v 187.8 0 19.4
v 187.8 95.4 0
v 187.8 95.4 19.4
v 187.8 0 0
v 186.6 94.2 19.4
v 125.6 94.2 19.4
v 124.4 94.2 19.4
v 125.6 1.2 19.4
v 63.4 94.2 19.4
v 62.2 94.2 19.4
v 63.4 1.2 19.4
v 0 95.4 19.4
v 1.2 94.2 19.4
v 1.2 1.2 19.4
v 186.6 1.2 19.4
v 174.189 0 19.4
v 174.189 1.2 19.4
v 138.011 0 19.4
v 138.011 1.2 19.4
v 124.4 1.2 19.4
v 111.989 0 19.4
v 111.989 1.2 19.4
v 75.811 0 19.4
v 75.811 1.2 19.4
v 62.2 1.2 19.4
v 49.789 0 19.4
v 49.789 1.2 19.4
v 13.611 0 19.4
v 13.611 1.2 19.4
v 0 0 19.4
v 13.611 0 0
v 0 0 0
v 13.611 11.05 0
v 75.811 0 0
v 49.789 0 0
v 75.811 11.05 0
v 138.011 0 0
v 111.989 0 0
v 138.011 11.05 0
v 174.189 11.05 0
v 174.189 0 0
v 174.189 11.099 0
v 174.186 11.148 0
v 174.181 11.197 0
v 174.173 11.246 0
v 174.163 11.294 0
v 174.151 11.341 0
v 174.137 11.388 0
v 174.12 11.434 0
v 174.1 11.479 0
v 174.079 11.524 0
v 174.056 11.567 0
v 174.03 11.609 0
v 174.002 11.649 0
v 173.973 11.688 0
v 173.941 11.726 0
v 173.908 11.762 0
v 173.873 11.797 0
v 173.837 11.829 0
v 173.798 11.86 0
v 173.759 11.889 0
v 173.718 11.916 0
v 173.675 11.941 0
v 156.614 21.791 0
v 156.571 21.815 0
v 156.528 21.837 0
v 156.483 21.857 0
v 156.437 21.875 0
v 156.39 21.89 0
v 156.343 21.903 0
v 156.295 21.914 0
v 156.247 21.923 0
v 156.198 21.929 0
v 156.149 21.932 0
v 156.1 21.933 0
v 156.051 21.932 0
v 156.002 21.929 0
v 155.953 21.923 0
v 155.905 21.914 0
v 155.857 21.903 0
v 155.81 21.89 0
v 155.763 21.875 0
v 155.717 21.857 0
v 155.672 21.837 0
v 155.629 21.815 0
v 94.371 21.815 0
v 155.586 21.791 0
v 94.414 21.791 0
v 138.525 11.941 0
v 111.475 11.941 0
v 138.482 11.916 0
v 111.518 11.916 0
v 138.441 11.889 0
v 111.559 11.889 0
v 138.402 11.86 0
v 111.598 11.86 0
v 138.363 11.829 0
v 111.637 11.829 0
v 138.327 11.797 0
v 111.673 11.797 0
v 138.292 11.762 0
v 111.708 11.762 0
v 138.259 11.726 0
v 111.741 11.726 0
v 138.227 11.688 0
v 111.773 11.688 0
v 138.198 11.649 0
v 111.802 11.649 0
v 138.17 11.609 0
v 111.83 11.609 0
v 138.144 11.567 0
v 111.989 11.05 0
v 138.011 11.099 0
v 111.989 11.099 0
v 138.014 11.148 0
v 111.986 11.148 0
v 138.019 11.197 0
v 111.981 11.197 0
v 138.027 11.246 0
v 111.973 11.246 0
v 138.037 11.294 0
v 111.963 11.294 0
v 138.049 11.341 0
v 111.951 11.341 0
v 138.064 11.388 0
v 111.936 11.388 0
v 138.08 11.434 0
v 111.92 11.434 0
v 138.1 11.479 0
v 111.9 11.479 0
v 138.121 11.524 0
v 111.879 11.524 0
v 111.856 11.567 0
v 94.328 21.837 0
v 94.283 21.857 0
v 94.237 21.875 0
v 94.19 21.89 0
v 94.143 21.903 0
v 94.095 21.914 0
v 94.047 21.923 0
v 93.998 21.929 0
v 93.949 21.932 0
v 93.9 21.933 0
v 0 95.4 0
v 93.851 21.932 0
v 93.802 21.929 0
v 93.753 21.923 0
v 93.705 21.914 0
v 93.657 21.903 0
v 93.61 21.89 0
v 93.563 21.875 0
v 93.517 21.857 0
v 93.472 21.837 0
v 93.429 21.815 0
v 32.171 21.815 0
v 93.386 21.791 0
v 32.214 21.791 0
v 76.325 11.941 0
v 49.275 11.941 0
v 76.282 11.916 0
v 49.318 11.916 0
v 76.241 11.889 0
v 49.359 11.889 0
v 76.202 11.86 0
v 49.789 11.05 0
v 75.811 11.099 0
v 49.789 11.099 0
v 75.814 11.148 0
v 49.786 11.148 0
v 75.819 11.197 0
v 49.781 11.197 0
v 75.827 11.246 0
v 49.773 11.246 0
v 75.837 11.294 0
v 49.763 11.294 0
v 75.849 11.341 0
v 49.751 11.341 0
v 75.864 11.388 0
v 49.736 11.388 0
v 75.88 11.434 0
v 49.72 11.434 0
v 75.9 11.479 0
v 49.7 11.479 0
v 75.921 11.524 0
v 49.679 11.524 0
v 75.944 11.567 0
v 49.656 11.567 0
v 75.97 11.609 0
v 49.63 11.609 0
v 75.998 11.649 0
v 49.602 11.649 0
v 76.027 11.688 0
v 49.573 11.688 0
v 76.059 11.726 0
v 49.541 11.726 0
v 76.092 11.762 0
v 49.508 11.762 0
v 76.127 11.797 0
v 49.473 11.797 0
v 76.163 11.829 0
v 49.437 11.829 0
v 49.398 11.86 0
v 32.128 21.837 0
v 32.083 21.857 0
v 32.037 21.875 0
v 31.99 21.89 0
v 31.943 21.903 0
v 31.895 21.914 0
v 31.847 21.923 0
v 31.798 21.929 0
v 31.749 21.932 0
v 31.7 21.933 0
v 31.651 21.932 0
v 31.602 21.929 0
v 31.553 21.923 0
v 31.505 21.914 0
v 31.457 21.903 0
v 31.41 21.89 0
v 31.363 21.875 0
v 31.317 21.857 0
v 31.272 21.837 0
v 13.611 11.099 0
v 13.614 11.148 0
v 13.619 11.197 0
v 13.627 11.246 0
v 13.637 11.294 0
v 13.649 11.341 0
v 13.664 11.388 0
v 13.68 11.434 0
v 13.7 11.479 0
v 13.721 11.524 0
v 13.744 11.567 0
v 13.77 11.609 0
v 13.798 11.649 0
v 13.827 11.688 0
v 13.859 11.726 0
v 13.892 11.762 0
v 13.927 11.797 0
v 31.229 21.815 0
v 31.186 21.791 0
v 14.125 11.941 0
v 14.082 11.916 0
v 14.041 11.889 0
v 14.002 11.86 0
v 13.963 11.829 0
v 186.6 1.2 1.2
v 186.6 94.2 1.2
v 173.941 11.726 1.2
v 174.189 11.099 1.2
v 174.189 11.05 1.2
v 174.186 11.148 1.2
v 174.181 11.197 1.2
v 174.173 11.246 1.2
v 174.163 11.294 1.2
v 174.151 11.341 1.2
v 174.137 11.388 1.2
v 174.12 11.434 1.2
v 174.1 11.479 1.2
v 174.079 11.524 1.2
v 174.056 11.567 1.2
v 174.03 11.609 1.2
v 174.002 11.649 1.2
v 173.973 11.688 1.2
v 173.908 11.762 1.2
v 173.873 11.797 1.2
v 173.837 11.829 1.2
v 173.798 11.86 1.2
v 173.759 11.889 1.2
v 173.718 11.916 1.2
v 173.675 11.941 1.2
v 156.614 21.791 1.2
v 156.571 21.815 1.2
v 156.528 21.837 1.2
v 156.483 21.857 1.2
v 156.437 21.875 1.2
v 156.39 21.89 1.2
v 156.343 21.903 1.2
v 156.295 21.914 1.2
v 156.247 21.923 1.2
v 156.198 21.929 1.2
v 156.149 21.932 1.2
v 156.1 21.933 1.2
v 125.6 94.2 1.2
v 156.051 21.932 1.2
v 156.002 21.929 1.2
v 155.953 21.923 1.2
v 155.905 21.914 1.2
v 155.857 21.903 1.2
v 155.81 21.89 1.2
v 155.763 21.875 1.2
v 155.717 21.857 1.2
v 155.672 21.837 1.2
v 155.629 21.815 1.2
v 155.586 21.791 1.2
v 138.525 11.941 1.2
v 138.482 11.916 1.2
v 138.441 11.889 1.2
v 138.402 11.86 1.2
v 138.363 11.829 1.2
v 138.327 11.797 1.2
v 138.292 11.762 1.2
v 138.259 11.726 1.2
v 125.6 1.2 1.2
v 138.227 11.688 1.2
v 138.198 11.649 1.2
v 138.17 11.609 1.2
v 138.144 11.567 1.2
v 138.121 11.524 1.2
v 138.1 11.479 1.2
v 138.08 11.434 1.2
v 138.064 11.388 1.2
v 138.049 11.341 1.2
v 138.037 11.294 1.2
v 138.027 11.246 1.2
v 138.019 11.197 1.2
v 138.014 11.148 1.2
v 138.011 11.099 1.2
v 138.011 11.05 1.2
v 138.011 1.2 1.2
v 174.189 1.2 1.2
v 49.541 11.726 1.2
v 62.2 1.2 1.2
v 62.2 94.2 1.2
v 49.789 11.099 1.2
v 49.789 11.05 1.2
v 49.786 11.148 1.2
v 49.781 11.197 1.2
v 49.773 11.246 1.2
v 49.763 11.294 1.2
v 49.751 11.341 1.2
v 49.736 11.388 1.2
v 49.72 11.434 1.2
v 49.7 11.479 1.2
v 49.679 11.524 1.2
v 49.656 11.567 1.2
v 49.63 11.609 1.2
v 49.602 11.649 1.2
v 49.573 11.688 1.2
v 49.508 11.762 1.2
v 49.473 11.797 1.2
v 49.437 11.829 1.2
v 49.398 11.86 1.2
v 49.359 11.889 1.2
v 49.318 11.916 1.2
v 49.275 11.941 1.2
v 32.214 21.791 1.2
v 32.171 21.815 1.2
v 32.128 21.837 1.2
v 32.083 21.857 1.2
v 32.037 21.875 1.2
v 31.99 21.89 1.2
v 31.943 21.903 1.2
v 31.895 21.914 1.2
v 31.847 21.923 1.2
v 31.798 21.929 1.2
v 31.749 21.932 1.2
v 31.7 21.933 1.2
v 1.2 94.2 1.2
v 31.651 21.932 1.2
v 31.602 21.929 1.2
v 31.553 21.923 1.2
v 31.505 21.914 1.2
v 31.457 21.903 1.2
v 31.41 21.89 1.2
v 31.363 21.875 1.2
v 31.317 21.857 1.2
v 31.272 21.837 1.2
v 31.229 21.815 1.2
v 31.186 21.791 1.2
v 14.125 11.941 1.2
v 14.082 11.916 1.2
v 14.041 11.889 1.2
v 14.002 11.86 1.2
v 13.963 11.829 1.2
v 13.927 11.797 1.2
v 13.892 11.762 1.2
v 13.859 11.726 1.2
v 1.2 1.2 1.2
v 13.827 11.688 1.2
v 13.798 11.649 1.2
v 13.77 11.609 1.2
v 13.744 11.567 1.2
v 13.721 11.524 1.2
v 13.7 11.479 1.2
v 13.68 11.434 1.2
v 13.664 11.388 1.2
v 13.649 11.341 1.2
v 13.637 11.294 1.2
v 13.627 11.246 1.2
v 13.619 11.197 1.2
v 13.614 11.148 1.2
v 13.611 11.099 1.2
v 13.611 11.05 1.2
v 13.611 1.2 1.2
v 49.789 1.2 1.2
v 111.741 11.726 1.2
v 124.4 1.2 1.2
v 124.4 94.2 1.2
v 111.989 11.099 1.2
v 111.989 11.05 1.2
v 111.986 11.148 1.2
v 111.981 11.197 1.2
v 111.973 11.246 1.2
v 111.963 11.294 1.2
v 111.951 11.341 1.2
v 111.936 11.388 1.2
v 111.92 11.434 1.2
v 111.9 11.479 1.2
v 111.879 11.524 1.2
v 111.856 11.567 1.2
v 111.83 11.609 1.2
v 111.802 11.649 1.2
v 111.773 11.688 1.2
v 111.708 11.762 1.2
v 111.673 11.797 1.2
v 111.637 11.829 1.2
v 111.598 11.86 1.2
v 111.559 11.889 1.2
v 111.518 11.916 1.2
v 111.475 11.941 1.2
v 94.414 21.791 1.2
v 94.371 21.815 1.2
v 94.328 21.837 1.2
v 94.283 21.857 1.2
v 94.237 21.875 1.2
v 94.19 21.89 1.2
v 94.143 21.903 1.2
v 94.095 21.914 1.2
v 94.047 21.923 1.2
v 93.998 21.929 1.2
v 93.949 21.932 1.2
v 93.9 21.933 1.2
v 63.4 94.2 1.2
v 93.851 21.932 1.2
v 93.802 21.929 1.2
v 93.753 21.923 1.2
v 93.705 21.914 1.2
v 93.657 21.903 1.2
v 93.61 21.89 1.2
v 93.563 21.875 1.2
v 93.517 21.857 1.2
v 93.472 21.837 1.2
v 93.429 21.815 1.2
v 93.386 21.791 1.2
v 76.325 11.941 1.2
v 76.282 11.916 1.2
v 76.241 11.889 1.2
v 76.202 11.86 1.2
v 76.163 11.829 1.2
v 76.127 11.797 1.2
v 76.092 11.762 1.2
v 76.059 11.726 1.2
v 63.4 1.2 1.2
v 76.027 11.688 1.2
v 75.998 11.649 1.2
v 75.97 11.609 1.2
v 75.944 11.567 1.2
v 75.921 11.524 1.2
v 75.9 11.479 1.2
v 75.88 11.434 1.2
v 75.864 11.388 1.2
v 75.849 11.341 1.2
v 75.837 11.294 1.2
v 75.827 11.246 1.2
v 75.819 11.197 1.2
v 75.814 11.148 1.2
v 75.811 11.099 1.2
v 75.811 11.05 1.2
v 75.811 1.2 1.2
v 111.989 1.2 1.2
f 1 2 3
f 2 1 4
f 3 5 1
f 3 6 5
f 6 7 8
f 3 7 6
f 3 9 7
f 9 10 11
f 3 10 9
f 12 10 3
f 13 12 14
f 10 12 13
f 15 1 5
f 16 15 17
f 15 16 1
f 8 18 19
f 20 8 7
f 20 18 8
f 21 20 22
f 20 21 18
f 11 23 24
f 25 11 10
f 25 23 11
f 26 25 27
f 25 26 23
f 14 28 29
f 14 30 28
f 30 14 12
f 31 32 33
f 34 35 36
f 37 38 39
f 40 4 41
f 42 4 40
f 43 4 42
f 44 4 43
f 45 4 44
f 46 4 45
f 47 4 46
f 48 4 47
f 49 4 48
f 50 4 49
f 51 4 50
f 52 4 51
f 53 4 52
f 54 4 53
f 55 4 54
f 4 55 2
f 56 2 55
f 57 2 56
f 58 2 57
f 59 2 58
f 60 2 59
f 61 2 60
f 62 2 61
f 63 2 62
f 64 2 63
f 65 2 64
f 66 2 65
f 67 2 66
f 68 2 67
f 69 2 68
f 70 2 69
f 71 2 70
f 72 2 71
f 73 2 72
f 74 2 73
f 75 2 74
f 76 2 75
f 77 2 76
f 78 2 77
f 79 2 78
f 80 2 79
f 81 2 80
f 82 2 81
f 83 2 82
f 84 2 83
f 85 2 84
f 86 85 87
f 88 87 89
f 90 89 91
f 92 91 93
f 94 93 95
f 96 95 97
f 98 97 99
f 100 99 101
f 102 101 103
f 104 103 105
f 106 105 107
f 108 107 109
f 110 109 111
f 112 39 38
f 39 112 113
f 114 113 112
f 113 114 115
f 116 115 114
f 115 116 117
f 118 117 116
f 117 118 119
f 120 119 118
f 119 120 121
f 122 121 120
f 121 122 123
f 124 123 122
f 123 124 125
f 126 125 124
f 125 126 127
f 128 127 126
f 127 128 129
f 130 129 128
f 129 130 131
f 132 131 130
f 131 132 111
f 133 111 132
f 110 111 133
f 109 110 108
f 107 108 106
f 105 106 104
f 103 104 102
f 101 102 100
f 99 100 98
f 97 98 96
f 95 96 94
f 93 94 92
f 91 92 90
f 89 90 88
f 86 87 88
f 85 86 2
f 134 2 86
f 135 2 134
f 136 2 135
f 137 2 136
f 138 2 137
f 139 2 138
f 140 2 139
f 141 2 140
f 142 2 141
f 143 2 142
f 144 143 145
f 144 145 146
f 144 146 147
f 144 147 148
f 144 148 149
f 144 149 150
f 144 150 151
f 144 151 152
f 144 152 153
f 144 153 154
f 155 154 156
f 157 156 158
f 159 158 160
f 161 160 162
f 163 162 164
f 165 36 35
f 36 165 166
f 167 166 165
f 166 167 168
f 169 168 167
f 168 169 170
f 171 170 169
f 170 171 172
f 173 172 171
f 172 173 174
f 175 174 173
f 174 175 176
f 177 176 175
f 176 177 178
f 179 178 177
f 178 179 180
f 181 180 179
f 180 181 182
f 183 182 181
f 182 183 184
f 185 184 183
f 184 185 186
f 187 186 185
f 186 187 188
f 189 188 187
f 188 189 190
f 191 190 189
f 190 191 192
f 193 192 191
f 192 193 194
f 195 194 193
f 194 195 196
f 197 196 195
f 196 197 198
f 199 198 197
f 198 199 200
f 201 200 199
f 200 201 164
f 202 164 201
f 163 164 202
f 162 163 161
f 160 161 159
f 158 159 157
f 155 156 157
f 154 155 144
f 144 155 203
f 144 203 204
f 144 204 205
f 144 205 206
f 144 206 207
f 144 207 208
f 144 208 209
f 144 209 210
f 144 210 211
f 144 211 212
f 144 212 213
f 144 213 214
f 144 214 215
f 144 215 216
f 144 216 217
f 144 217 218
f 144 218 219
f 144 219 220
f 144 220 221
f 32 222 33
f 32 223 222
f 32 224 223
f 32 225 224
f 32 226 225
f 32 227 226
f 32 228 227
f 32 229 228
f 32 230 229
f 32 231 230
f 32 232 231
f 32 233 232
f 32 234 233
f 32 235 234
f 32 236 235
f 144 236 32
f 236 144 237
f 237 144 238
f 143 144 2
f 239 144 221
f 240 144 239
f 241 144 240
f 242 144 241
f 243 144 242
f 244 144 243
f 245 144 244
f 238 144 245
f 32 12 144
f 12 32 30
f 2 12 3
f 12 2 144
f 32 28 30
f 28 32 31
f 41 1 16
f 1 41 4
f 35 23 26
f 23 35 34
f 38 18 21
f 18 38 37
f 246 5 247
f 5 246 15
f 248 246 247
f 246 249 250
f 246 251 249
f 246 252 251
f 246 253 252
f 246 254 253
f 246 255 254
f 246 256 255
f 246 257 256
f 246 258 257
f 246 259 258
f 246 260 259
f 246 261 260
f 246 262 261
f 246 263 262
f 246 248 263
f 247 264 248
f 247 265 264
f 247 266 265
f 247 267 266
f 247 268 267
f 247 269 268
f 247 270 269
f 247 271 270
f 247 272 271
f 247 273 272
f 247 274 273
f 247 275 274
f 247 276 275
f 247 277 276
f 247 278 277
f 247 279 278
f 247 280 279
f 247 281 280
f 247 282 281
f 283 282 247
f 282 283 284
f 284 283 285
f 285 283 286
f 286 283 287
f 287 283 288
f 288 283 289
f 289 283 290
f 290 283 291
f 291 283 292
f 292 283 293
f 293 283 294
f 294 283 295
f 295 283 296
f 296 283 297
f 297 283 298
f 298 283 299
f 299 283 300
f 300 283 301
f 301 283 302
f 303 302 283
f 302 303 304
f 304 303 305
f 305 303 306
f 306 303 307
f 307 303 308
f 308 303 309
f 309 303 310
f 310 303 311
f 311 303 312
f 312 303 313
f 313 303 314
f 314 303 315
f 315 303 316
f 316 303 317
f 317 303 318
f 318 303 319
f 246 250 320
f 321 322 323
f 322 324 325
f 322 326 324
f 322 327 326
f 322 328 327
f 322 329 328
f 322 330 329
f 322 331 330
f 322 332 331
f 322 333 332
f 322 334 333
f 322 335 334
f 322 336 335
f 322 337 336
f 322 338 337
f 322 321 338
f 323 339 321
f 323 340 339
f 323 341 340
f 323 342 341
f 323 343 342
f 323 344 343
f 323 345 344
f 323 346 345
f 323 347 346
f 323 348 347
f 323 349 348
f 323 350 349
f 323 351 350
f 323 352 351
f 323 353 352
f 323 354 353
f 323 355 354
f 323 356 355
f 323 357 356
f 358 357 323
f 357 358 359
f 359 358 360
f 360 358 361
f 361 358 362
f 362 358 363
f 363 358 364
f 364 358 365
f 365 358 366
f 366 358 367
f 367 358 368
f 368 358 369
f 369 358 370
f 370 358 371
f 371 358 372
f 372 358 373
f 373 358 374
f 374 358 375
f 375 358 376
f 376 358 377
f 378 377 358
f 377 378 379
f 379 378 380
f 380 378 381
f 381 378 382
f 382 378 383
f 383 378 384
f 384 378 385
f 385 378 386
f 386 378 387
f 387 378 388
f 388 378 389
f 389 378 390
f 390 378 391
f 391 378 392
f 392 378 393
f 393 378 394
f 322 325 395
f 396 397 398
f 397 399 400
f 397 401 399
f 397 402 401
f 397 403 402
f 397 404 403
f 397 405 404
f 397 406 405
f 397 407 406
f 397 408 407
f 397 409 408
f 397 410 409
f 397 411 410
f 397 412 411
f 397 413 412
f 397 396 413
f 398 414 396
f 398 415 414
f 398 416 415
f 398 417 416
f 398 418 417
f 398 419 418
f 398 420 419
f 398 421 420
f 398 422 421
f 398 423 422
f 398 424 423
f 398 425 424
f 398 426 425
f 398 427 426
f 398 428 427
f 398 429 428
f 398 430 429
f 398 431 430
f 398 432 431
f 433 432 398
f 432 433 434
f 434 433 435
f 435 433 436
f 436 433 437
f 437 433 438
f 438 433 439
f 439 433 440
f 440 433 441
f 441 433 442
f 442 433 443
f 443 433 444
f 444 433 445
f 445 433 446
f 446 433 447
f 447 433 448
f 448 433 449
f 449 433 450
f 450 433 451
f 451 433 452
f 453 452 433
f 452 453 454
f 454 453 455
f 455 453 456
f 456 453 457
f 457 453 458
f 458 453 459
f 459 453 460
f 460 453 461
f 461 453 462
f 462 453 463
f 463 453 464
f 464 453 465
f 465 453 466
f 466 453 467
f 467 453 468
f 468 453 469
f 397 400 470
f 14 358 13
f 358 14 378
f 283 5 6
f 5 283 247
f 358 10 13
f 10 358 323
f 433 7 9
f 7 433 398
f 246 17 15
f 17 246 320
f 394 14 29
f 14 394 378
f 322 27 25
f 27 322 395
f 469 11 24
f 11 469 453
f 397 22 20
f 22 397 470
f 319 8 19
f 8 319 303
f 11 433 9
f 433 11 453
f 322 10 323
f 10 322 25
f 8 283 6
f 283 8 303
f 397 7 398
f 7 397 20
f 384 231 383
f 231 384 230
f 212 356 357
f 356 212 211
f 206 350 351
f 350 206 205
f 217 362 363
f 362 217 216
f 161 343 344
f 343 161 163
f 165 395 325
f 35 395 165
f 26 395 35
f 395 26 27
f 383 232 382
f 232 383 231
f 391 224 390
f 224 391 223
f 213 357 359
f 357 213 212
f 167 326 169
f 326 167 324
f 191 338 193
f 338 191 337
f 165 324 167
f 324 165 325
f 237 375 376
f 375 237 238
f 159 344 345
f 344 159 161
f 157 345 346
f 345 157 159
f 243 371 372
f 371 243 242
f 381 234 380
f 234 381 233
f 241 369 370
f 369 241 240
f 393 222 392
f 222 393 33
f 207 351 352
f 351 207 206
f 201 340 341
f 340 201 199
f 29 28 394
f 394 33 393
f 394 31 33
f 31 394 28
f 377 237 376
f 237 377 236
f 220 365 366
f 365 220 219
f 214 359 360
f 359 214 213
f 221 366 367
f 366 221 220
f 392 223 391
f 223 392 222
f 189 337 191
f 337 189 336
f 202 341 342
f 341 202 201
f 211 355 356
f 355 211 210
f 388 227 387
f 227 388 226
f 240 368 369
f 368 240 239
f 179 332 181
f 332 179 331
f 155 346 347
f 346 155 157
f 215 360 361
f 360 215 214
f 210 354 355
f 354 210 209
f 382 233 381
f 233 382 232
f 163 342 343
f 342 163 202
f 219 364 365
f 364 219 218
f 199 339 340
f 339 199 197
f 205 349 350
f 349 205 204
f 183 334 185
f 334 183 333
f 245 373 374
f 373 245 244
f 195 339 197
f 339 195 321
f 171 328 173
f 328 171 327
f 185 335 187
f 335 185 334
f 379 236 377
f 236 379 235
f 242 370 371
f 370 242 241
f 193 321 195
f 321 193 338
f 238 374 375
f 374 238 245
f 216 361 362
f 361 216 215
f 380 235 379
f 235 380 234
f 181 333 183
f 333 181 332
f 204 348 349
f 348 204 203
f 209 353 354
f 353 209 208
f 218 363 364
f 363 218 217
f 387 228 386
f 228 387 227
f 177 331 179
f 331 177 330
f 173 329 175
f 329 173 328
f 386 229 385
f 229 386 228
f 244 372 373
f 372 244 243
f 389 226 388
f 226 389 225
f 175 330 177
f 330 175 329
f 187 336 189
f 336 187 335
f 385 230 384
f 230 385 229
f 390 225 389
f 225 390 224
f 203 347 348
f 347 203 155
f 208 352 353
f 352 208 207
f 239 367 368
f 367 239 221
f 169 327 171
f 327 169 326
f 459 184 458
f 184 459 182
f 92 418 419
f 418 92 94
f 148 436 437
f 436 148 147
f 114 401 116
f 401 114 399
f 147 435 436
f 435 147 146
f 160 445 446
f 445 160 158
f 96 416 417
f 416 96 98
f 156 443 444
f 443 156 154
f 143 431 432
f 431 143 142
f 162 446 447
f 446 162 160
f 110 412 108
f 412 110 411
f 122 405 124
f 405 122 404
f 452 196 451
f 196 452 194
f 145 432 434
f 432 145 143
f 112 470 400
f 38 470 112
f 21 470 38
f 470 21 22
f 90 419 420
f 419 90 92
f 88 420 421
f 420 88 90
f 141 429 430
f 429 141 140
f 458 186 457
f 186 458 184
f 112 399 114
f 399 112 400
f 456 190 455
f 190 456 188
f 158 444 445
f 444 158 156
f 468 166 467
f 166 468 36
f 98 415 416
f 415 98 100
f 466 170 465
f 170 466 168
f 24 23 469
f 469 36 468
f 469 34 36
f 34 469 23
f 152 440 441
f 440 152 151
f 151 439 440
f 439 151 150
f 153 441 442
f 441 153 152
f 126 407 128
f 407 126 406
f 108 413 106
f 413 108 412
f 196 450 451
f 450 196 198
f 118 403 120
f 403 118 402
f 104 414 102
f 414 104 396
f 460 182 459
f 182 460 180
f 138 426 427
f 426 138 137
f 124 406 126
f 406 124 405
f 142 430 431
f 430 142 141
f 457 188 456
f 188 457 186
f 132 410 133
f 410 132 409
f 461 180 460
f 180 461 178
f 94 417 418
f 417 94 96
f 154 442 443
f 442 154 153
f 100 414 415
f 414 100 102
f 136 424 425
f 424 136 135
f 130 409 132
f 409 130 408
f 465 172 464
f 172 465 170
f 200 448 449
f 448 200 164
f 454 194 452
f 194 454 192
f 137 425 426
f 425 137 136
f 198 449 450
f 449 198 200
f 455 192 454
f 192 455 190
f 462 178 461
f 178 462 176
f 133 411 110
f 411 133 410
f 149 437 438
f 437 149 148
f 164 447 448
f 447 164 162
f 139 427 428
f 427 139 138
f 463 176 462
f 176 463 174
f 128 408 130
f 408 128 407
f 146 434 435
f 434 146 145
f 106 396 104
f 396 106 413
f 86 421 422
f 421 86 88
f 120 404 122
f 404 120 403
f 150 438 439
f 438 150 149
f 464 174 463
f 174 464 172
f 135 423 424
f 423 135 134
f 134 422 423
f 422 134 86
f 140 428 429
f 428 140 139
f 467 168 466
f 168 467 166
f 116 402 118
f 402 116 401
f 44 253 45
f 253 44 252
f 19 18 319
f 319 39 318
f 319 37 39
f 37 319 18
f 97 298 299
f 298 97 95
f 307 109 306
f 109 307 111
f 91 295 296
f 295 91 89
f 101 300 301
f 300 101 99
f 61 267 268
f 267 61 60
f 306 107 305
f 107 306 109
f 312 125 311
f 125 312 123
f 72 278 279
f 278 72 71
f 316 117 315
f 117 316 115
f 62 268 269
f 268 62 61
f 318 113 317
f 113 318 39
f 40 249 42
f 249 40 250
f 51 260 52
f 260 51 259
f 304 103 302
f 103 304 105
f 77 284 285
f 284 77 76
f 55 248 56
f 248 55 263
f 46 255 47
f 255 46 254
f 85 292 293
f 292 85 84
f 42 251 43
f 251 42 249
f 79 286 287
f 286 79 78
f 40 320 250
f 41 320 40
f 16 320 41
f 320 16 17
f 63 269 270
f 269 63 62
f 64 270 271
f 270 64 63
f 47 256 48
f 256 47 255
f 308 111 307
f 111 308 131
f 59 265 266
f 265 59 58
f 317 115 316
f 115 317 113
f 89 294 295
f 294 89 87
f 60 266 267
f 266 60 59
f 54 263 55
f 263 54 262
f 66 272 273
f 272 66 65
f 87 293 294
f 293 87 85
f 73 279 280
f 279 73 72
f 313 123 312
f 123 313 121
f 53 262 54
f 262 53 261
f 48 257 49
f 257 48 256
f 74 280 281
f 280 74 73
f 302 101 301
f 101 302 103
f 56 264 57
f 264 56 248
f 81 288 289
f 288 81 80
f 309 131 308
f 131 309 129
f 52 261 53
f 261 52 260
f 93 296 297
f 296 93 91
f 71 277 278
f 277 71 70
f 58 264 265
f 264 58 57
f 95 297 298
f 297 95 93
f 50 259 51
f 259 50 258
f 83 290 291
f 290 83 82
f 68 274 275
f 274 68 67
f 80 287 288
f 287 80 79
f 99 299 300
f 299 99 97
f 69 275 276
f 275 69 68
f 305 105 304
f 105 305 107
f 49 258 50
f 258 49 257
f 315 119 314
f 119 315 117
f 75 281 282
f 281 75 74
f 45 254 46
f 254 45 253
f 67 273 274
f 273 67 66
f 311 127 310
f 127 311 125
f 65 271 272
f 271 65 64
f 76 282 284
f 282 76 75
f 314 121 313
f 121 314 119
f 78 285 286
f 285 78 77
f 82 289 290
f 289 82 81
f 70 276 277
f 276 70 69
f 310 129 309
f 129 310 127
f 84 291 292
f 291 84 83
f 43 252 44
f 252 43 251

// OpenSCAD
// file: ../../internal/tray.scad
// Copyright 2023 Joshua Star, All Rights Reserved

include <base.scad>
include <prim.scad>

module tray_basic(inner_size, r=0, thickness=DEFAULT_THICKNESS, bottom_thickness=undef) {

	half_z = inner_size.z / 2;
	radius = min(r, half_z);

	bottom_thk = bottom_thickness != undef ? bottom_thickness : thickness;

	thk2 = thickness * 2;

	outer_size = inner_size + [thk2, thk2, bottom_thk];
	echo("tray outer dimensions are: ", outer_size);

	inner_radius = radius - thickness;

	union() {
		difference() {
			// outer shell
			if (0 < r) {
				union() {
					translate([0, 0, bottom_thk])
						cylinder_cube([outer_size.x, outer_size.y, outer_size.z - bottom_thk], r=radius);
					cylinder_cube([outer_size.x, outer_size.y, bottom_thk], inner_radius, radius);
				}
			}
			else {
				cube(outer_size);
			}
			
			// lip cutout
			if (0 < radius) {
				translate([0, 0, inner_size.z + SMALL_NUM])
					cylinder_cube([outer_size.x, outer_size.y, bottom_thk], r1=inner_radius, r2=radius);
			}

			// inner cutout
			if (0 < radius) {
				translate([thickness, thickness, bottom_thk])
					rounded_cube(inner_size + [0, 0, bottom_thk], r=inner_radius, flat_top=true);
			}
			else {
				translate([thickness, thickness, bottom_thk])
						cube(inner_size + [0, 0, bottom_thk]);
			}
		}
	}
}

module tray_divided(size, r=0, div_x=1, div_y=1, thickness=DEFAULT_THICKNESS, bottom_thickness=undef, div_height=undef, div_thickness=undef) {

	bottom_thk = bottom_thickness != undef ? bottom_thickness : thickness;

	div_thk = div_thickness != undef ? div_thickness : thickness;
	div_z = div_height != undef ? div_height : size.z;

	max_div_z = 0 == r ? size.z : size.z - bottom_thk;
	clamped_div_z = min(div_z, max_div_z);

	x_minus_div = size.x - (div_thk * (div_x - 1));
	y_minus_div = size.y - (div_thk * (div_y - 1));

	x_off = (x_minus_div / div_x) + div_thk;
	y_off = (y_minus_div / div_y) + div_thk;
	
	union() {
		tray_basic(size, r=r, thickness=thickness, bottom_thickness=bottom_thk);

		// columns, along x
		for (i=[1:1:div_x-1]) {
			translate([i * x_off, thickness, bottom_thk])
				cube([div_thk, size.y, clamped_div_z]);
		}

		// rows, along y
		for (i=[1:1:div_y-1]) {
			translate([thickness, i * y_off, bottom_thk])
				cube([size.x, div_thk, clamped_div_z]);
		}
	}
}

module notch_cutter(h, r) {
	n = 6;
	rotate([0, 0, 180 / n]) cylinder_ngon(2 * r, h, n);
}

module tray_notched(size, div_x=1, div_y=1, thickness=DEFAULT_THICKNESS, bottom_thickness=undef, div_height=undef, div_thickness=undef, notch_lo_x=true, notch_hi_x=true) {

	bottom_thk = bottom_thickness != undef ? bottom_thickness : thickness;

	div_thk = div_thickness != undef ? div_thickness : thickness;
	div_z = div_height != undef ? div_height : size.z;

	x_minus_div = size.x - (div_thk * (div_x - 1));

	x_off = (x_minus_div / div_x) + div_thk;
	
	div_bias = (div_thk - x_off) / 2;

	notch_h = size.z + bottom_thk + 2 * SMALL_NUM;
	notch_r = x_off / 3;

	difference() {
		tray_divided(size, div_x=div_x, div_y=div_y, thickness=thickness, bottom_thickness=bottom_thk, div_height=div_z, div_thickness=div_thk);

		// notch along x
		for (i=[1:1:div_x]) {

			if (notch_lo_x) {
				translate([i * x_off + div_bias, thickness, -SMALL_NUM])
					notch_cutter(notch_h, notch_r);
			}

			if (notch_hi_x) {
				translate([i * x_off + div_bias, size.y + thickness, -SMALL_NUM])
					notch_cutter(notch_h, notch_r);
			}
		}
	}
}

// --- TESTING ---

//tray_basic([240, 120, 30], r=4);

//translate([-1.2, -1.2, 0]) tray_divided([200, 100, 5], div_x=20, div_y=10);
//tray_divided([180, 120, 30], r=15, div_x=3, div_y=2, div_height=25);

//translate([-1.2, -1.2, 0]) tray_notched([200, 100, 30], div_x=20, div_y=10);
// file: ../../internal/prim.scad
// Copyright 2023 Joshua Star, All Rights Reserved

module cylinder_cube(size, r1=1, r2=1, r=undef) {
	r1 = r != undef ? r : r1;
	r2 = r != undef ? r : r2;

	r_max = max(r1, r2);
	hull() {
		translate([r_max, r_max, 0])
			cylinder(size.z, r1, r2);
		translate([size.x - r_max, r_max, 0])
			cylinder(size.z, r1, r2);
		translate([r_max, size.y - r_max, 0])
			cylinder(size.z, r1, r2);
		translate([size.x - r_max, size.y - r_max, 0])
			cylinder(size.z, r1, r2);
	}
}

module cylinder_ngon(width, h, n=6, r=1) {
	hull() {
		for (i=[0:1:n-1]) {
			angl_off = 360 / n;
			posx_off = width / 2 - r;
			rotate([0, 0, i * angl_off]) translate([posx_off, 0, 0])
				cylinder(r=r, h=h);
		}
	}
}

module cylinder_trap(size, ratio, radius=1) {
	hull() {
		half_size_x = size.x / 2;
		translate([radius - half_size_x, radius, 0])
			cylinder(r=radius, h=size.z);
		translate([half_size_x - radius, radius, 0])
			cylinder(r=radius, h=size.z);
		translate([radius - ratio * half_size_x, size.y - radius, 0])
			cylinder(r=radius, h=size.z);
		translate([ratio * half_size_x - radius, size.y - radius, 0])
			cylinder(r=radius, h=size.z);
	}
}

module rounded_cube(size, r=1, flat_top=false) {
	
	half_z = size.z / 2;
	radius = min(r, half_z);
	
	hull() {
		// bottom 'points'
		translate([radius,radius,radius]) sphere(r=radius);
		translate([size.x-radius,radius,radius]) sphere(r=radius);
		translate([radius,size.y-radius,radius]) sphere(r=radius);
		translate([size.x-radius,size.y-radius,radius]) sphere(r=radius);

		// top 'points'
		pos_z = size.z - radius;
		if (flat_top) {
			translate([radius, radius, pos_z]) cylinder(r=radius, h=radius);
			translate([size.x-radius, radius, pos_z]) cylinder(r=radius, h=radius);
			translate([radius, size.y-radius, pos_z]) cylinder(r=radius, h=radius);
			translate([size.x-radius, size.y-radius, pos_z]) cylinder(r=radius, h=radius);
		}
		else {
			translate([radius, radius, pos_z]) sphere(r=radius);
			translate([size.x-radius, radius, pos_z]) sphere(r=radius);
			translate([radius, size.y-radius, pos_z]) sphere(r=radius);
			translate([size.x-radius, size.y-radius, pos_z]) sphere(r=radius);
		}
	}
}

// --- TESTING ---

//cylinder_cube([240, 120, 30], r=8);

//cylinder_cube([240, 120, 16], r1=4, r2=8);
//cylinder_cube([240, 120, 16], r1=8, r2=4);

//cylinder_ngon(10, 5, 7, 1);

//cylinder_trap([100, 50, 30], 0.5, radius=8);

//rounded_cube([240, 120, 30], r=12);
//rounded_cube([240, 120, 30], r=12, flat_top=true);
//rounded_cube([240, 120, 30], r=30, flat_top=true);
// file: ../../internal/math.scad
// Copyright 2023 Joshua Star, All Rights Reserved

function clamp(x, lower, upper) = x < lower ? lower : (upper < x ? upper : x);
function lerp(lower, upper, s) = (upper - lower) * s + lower;
// file: ../../internal/card.scad
// Copyright 2023 Joshua Star, All Rights Reserved

TOLERANCE_MIN = [0.4, 0.4];
TOLERANCE_MAX = [0.8, 0.8];

function std_card_dim() = [67, 93] + TOLERANCE_MIN; // gray
function amer_card_dim() = [59, 91] + TOLERANCE_MIN; // green
function euro_card_dim() = [62, 94] + TOLERANCE_MIN; // purple

function mini_amer_card_dim() = [44, 67] + TOLERANCE_MIN; // yellow
function mini_euro_card_dim() = [46, 71] + TOLERANCE_MIN; // ruby

function 7won_card_dim() = [67, 103] + TOLERANCE_MAX; // brown
function tarot_card_dim() = [73, 122] + TOLERANCE_MAX; // orange

function per_card_thickness() = 0.68;

function calc_card_stack(n, padding=1.2) = n * per_card_thickness() + padding;
// file: ../../internal/base.scad
// Copyright 2023 Joshua Star, All Rights Reserved

fn = $preview ? 16 : 128;
$fn = fn;

SMALL_NUM = $preview ? 0.02 : 0.001;

DEFAULT_PADDING = 1.6;
DEFAULT_THICKNESS = 1.2;
// file: ../../boardgame_tk.scad
// Copyright 2023 Joshua Star, All Rights Reserved

include <internal/base.scad>
include <internal/card.scad>
include <internal/math.scad>
include <internal/prim.scad>
include <internal/tray.scad>

function default_padding() = DEFAULT_PADDING;
function default_thickness() = DEFAULT_THICKNESS;

function gamebox_common() = [286, 286, 68]; // Terraforming Mars, Wingspan

function make_list(v, n) = [for(i=[0:n-1]) v];
function sum_list(v) = [for(p=v) 1] * v;

module card_display(card_size, height, num_stacks, padding=DEFAULT_PADDING, thickness=DEFAULT_THICKNESS, bottom_thickness=undef, div_thickness=undef) {

	div_thk = div_thickness != undef ? div_thickness : thickness;

	dim_x = (card_size.x + padding) * num_stacks + (div_thk * (num_stacks - 1));
	dim_y = card_size.y + padding;
	dim_z = height;

	tray_notched([dim_x, dim_y, dim_z], div_x=num_stacks, thickness=thickness, bottom_thickness=bottom_thickness, div_thickness=div_thickness, notch_hi_x=false);
}

module vertical_cutter(size, r=0.5) {
	difference() {
		translate([0, size.z, 0]) rotate([90, 0, 0])
		linear_extrude(height=size.z) {
			translate([0, r, 0])
			offset(r=-r) {
				offset(r=2*r) {
					union() {
						translate([-(size.x + 2 * r) / 2, 0, 0]) square([size.x + 2 * r, 1]);
						translate([-(size.x - 2 * r)/2, -size.y, 0]) square([size.x - 2 * r, size.y]);
					}
				}
			}
		}

		translate([-(size.x + r), -size.z, 0])
			cube([2 * (size.x + r), 3 * size.z, 2 * (size.y + r)]);
	}
}

module card_tray(card_size, stacks, num_columns=1, padding=[0.8, 0.8, 0.8], thickness=DEFAULT_THICKNESS, bottom_thickness=undef, div_height=undef, div_thickness=undef) {

	bottom_thk = bottom_thickness != undef ? bottom_thickness : thickness;

	div_thk = div_thickness != undef ? div_thickness : thickness;

	col_dim_x = card_size.y + padding.x;

	dim_x = col_dim_x * num_columns + div_thk * (num_columns - 1);
	dim_y = sum_list(stacks) + (div_thk + padding.y) * (len(stacks) - 1);
	dim_z = card_size.x + padding.z;

	div_z = div_height != undef ? div_height : dim_z;

	min_card_dim = min(card_size.x, card_size.y);
	cutter_radius = min_card_dim / 6;

	difference() {
		union() {
			tray_divided([dim_x, dim_y, dim_z], div_x=num_columns, thickness=thickness, bottom_thickness=bottom_thickness);

			div_offsets = [
				for (a=0, b=stacks[0]; a < (len(stacks) - 1); a = a + 1, b = b + (stacks[a]==undef?0:stacks[a]) + padding.y + div_thk)
					b
				];

			// columns, along x
			for (c=[0:1:num_columns-1]) {
				// rows, along y
				for (y=div_offsets) {
					x_off = c * (col_dim_x + div_thk) + thickness;

					translate([x_off, y, bottom_thk])
						cube([col_dim_x, div_thk, div_z]);
				}
			}
		}

		cutout_size = [col_dim_x / 2, dim_z / 2, thickness + 2 * SMALL_NUM];
		cutout_z = bottom_thk + dim_z + SMALL_NUM;

		// cutout
		for (c=[0:1:num_columns-1]) {
			n = 8;

			x_off = c * (col_dim_x + div_thk) + (col_dim_x / 2) + thickness;

			// front cut
			translate([x_off, -SMALL_NUM, cutout_z])
					vertical_cutter(cutout_size, r=cutter_radius);
			
			// back cut
			translate([x_off, dim_y + thickness - SMALL_NUM, cutout_z])
					vertical_cutter(cutout_size, r=cutter_radius);
			
			// middle cut
			translate([x_off, thickness, bottom_thk + div_z + SMALL_NUM])
					vertical_cutter([cutout_size.x, div_z / 2, dim_y], r=cutter_radius);
		}
	}
}

module spacer(size, r=16, div_x=2, div_y=2, spacing=16) {
	difference() {
		cylinder_cube(size, r=r);

		half_spacing = spacing / 2;
		inner_radius = r - half_spacing;

		offset_x = size.x / div_x;
		offset_y = size.y / div_y;
		for (i=[0:1:div_x]) {
			for (j=[0:1:div_y]) {
				translate([i * offset_x + half_spacing, j * offset_y + half_spacing, -1])
				cylinder_cube([
					size.x / div_x - spacing,
					size.y / div_y - spacing,
					size.z + 2], r=inner_radius);
			}
		}
	}
}

module pegs_grid(rows=1, cols=1, radius=1, height=1, spacing=1, alt_pack=false) {
	x_start = spacing + radius;
	y_start = spacing + radius;

	x_alt_start = radius + spacing / 2;

	x_offset = 2 * radius + spacing;
	y_offset = alt_pack ? ((radius + spacing / 2) * sqrt(3)) : 2 * radius + spacing;

	for (r=[0:1:rows-1]) {
		is_alt = alt_pack ? (r % 2) : 0;
		for (c=[0:1:cols-(1 + is_alt)]) {
			translate([
					c * x_offset + x_start + x_alt_start * is_alt,
					r * y_offset + y_start,
					0])
				cylinder(h=height, r=radius);
		}
	}
}

module peg_board(rows=1, cols=1, radius=1, height=1, spacing=1) {
	difference() {
		cylinder_cube([
			cols * 2 * radius + (cols + 1) * spacing,
			rows * 2 * radius + (rows + 1) * spacing,
			height], r=radius);

		translate([0, 0, -height/2])
			pegs_grid(rows=rows, cols=cols, radius=radius, height=2*height, spacing=spacing, alt_pack=false);
	}
}

// --- TESTING ---

//%cube(gamebox_common());

//card_display(mini_euro_card_dim(), 30, 3);

//vertical_cutter([100,50, 10], r=10);

//card_tray(std_card_dim(), [30, 30, 8, 8, 8, 16, 42], num_columns=4, div_height=55);

//spacer([240, 120, 10], r=16, div_x=4, div_y=3, spacing=8);

//pegs_grid(rows=4, cols=5, radius=32, height=4, spacing=6, alt_pack=false);
//pegs_grid(rows=4, cols=5, radius=32, height=4, spacing=6, alt_pack=true);

//peg_board(rows=3, cols=4, radius=28, height=4, spacing=6);
// main file
// Copyright 2023 Joshua Star, All Rights Reserved

use <../../boardgame_tk.scad>

depth = calc_card_stack(25);

card_display(amer_card_dim(), depth, 3);
